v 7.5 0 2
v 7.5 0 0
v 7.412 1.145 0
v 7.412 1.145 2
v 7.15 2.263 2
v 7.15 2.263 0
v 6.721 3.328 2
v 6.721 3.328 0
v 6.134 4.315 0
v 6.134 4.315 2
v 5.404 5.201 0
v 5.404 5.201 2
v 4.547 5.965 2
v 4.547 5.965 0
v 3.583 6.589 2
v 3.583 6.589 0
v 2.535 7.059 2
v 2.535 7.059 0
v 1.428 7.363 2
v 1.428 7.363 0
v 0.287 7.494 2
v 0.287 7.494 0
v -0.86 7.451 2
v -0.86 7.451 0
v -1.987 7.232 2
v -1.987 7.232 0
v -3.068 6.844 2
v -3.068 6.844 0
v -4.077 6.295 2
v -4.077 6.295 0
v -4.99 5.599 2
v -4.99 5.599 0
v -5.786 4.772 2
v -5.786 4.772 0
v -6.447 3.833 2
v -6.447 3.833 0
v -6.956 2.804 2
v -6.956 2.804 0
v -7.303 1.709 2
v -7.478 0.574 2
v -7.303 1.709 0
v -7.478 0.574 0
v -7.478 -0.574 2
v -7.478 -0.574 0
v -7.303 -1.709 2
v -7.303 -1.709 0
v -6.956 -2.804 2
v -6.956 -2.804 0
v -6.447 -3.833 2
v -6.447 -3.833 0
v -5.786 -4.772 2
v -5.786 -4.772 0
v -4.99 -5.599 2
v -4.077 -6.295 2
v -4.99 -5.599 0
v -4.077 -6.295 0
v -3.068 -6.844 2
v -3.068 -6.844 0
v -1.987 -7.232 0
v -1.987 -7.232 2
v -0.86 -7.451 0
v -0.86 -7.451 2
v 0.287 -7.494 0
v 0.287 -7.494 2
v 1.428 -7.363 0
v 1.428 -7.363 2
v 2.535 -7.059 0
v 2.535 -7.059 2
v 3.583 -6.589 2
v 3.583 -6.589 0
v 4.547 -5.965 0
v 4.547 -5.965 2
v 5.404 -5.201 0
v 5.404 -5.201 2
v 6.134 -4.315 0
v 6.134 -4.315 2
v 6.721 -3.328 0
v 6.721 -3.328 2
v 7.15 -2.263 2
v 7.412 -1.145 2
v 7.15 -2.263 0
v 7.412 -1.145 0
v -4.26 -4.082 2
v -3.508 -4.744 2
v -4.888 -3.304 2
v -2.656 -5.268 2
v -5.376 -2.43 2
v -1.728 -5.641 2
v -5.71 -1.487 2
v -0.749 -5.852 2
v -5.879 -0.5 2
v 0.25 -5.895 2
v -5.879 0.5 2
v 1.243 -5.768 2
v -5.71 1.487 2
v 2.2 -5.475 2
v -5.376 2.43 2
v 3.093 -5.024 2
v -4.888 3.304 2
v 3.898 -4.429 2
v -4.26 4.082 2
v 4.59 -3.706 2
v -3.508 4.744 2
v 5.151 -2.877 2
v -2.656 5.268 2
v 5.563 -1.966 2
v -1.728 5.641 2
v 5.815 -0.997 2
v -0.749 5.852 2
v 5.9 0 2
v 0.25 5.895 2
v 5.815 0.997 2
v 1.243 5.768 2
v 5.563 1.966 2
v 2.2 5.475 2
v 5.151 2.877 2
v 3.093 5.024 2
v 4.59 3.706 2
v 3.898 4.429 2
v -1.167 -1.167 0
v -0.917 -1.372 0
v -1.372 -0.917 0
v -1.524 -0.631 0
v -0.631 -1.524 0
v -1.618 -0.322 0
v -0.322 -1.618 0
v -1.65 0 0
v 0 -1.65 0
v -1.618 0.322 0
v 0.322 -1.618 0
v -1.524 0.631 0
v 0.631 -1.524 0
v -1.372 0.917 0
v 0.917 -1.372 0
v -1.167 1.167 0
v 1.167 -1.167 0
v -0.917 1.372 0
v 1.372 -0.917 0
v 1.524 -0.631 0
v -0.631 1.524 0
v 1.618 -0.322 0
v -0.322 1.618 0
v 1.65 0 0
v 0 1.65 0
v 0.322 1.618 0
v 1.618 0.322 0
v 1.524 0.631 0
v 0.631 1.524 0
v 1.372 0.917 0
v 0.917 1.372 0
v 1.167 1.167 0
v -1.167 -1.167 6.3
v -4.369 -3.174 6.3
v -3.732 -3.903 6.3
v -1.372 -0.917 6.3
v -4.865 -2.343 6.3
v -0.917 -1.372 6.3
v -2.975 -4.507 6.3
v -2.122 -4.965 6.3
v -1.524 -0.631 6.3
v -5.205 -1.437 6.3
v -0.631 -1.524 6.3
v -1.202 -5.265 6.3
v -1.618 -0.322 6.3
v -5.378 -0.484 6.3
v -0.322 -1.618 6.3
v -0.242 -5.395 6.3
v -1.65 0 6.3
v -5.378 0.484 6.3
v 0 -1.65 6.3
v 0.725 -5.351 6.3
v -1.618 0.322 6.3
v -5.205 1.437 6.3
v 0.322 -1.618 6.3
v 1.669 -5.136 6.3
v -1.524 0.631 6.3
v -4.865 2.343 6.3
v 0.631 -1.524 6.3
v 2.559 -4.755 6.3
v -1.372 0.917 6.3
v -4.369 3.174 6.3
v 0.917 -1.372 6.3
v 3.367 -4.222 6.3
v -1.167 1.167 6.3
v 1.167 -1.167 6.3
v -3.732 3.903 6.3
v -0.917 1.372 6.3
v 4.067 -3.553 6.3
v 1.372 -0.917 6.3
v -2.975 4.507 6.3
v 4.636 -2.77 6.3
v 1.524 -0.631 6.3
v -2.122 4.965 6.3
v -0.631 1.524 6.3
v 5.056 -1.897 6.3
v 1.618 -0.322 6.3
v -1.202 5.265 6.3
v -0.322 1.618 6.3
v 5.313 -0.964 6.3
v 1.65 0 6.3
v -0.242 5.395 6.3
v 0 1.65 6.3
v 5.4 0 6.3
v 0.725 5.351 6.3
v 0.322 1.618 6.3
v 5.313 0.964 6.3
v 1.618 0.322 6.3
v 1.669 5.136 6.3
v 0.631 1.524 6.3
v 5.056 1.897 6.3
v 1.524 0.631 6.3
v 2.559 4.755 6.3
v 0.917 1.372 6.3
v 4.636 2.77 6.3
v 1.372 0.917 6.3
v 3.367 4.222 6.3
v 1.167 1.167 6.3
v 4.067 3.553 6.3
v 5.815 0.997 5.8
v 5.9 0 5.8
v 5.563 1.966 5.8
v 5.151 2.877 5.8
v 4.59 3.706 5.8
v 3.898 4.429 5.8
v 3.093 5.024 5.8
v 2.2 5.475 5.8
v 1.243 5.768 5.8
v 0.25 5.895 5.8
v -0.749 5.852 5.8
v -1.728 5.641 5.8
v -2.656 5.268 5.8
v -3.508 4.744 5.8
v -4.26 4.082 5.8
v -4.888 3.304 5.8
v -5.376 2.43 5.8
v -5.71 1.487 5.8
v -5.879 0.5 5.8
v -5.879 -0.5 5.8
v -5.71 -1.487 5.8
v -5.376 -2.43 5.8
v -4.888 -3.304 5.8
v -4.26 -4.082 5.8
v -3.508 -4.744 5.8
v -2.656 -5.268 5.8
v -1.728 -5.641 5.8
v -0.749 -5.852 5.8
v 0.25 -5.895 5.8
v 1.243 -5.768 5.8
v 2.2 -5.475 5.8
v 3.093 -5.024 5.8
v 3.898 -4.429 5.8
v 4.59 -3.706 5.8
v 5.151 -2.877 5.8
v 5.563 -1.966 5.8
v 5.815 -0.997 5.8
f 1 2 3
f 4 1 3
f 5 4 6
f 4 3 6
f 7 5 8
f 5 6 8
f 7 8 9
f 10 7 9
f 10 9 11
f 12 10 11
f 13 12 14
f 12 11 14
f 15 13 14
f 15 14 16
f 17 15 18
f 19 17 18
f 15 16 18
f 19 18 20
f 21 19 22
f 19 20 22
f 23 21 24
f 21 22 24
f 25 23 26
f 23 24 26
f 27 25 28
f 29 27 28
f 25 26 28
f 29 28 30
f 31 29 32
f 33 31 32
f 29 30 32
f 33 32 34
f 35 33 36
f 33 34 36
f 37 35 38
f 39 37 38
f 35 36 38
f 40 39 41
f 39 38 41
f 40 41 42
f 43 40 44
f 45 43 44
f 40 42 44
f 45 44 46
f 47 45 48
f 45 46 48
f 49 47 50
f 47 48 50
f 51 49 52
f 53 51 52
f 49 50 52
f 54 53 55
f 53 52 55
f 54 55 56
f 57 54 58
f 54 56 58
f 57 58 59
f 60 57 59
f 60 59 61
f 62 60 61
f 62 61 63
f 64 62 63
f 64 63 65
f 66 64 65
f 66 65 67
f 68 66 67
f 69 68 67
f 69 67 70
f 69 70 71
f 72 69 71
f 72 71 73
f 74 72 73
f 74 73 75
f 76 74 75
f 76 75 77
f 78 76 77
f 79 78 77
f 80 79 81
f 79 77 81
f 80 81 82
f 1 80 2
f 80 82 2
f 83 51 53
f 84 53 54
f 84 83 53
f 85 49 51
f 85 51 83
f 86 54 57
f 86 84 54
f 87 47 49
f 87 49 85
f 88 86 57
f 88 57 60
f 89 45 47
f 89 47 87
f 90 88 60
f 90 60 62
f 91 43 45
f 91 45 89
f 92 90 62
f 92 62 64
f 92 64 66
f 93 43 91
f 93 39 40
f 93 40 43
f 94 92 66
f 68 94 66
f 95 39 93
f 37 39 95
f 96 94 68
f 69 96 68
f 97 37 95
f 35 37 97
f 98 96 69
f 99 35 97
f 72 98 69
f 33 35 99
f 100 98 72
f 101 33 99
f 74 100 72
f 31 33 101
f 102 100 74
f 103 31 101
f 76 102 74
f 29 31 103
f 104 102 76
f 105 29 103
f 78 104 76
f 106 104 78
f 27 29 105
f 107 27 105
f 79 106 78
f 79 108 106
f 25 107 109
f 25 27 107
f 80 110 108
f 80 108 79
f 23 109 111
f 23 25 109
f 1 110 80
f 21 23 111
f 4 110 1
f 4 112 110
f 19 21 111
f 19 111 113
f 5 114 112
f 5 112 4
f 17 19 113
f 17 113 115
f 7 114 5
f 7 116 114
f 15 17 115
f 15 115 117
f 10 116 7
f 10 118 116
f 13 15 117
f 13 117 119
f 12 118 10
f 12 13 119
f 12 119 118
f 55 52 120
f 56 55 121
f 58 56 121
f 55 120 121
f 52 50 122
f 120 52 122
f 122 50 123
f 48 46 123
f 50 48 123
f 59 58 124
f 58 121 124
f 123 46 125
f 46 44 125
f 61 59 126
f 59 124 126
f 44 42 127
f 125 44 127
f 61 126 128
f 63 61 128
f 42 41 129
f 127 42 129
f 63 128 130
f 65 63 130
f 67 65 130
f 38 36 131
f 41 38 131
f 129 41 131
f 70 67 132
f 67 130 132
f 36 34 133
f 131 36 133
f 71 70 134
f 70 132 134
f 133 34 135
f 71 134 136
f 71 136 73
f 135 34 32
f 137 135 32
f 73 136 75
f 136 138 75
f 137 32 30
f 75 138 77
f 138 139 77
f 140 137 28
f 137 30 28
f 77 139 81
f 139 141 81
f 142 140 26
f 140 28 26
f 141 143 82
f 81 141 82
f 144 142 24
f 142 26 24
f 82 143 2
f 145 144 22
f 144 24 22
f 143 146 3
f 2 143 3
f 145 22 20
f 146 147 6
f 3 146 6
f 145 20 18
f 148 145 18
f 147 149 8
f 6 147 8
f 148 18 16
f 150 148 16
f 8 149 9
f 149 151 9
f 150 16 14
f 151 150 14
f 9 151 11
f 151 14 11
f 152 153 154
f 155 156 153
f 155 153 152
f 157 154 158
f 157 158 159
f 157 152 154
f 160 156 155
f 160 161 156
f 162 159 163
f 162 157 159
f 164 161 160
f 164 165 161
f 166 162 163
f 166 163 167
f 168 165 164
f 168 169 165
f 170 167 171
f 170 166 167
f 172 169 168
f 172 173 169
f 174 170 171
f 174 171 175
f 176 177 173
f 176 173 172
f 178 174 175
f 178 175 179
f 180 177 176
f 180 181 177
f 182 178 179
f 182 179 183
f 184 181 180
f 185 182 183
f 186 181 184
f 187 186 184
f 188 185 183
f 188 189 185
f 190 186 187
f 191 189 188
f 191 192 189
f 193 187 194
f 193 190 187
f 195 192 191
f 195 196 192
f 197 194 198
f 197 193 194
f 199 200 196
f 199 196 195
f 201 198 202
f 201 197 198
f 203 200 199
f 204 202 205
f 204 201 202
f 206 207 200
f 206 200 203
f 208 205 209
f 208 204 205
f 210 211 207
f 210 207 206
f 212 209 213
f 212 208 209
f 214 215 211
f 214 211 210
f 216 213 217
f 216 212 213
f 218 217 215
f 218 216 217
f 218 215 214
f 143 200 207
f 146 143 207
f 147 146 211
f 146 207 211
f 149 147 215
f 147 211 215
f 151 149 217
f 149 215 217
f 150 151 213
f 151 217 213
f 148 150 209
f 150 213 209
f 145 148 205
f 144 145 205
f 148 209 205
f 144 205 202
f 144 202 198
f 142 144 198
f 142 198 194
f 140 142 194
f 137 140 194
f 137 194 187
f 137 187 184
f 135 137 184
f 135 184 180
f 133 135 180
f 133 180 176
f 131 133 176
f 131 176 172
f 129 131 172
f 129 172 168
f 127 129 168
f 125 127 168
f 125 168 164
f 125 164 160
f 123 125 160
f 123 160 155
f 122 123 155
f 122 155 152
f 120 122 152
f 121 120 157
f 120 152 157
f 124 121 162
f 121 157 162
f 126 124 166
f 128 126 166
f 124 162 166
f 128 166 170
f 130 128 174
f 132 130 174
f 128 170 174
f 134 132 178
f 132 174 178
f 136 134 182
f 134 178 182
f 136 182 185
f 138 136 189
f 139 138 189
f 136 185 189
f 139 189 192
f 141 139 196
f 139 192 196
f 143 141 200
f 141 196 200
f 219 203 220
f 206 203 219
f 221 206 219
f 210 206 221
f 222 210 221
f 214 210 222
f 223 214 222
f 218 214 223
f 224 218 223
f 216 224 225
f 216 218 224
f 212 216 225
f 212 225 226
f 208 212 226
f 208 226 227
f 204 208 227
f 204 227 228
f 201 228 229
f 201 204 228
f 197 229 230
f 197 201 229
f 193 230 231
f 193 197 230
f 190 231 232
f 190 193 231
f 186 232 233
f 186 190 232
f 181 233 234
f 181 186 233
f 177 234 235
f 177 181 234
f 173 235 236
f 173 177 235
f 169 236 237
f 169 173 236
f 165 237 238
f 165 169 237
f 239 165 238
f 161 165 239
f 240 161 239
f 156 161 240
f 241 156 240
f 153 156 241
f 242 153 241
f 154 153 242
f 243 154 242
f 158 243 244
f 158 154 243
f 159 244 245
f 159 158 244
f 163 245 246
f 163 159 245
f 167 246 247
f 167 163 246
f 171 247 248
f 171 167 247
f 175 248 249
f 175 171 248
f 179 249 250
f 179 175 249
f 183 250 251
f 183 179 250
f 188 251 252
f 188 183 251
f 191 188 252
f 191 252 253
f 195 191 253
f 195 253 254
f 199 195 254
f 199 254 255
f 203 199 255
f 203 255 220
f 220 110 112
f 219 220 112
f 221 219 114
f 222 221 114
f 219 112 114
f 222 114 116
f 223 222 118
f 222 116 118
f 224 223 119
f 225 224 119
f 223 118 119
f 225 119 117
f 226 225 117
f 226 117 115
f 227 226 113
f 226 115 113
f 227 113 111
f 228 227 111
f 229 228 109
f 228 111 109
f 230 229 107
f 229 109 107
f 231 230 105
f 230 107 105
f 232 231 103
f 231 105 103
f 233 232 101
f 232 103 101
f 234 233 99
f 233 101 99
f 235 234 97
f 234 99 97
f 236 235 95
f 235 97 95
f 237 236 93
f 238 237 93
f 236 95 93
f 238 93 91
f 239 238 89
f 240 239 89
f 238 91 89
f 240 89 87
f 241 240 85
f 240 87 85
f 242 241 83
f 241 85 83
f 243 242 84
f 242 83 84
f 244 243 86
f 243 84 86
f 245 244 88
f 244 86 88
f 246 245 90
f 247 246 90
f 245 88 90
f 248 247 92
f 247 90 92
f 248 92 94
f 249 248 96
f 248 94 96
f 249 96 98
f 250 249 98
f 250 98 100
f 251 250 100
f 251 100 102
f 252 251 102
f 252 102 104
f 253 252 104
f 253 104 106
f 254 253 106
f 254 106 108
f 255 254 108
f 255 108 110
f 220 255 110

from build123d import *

# Parameters (mm, degrees)
F0_R     = 7.5
F1_DEPTH = 2
F2_R     = 5.9
F3_DEPTH = 4.3
F4_R     = 1.65
F5_DEPTH = 6.301
F6_SIZE  = 0.5


with BuildPart() as f1:
    # F0 (on Top) → F1 (new body)
    with BuildSketch(Plane.XY):
        Circle(F0_R)
    extrude(amount=F1_DEPTH)

    # F2 (on face) → F3 (join)
    with BuildSketch(Plane.XY.offset(2)):
        Circle(F2_R)
    extrude(amount=F3_DEPTH)

    # F4 (on face) → F5 (cut, through all)
    with BuildSketch(Plane.XY.offset(6.3)):
        Circle(F4_R)
    extrude(amount=-F5_DEPTH, mode=Mode.SUBTRACT)

    # F6
    f6_edges = [f1.edges().sort_by_distance(p)[0] for p in [
        (-5.9, 0, 6.3),
    ]]
    chamfer(f6_edges, length=F6_SIZE)


solid = f1.part
